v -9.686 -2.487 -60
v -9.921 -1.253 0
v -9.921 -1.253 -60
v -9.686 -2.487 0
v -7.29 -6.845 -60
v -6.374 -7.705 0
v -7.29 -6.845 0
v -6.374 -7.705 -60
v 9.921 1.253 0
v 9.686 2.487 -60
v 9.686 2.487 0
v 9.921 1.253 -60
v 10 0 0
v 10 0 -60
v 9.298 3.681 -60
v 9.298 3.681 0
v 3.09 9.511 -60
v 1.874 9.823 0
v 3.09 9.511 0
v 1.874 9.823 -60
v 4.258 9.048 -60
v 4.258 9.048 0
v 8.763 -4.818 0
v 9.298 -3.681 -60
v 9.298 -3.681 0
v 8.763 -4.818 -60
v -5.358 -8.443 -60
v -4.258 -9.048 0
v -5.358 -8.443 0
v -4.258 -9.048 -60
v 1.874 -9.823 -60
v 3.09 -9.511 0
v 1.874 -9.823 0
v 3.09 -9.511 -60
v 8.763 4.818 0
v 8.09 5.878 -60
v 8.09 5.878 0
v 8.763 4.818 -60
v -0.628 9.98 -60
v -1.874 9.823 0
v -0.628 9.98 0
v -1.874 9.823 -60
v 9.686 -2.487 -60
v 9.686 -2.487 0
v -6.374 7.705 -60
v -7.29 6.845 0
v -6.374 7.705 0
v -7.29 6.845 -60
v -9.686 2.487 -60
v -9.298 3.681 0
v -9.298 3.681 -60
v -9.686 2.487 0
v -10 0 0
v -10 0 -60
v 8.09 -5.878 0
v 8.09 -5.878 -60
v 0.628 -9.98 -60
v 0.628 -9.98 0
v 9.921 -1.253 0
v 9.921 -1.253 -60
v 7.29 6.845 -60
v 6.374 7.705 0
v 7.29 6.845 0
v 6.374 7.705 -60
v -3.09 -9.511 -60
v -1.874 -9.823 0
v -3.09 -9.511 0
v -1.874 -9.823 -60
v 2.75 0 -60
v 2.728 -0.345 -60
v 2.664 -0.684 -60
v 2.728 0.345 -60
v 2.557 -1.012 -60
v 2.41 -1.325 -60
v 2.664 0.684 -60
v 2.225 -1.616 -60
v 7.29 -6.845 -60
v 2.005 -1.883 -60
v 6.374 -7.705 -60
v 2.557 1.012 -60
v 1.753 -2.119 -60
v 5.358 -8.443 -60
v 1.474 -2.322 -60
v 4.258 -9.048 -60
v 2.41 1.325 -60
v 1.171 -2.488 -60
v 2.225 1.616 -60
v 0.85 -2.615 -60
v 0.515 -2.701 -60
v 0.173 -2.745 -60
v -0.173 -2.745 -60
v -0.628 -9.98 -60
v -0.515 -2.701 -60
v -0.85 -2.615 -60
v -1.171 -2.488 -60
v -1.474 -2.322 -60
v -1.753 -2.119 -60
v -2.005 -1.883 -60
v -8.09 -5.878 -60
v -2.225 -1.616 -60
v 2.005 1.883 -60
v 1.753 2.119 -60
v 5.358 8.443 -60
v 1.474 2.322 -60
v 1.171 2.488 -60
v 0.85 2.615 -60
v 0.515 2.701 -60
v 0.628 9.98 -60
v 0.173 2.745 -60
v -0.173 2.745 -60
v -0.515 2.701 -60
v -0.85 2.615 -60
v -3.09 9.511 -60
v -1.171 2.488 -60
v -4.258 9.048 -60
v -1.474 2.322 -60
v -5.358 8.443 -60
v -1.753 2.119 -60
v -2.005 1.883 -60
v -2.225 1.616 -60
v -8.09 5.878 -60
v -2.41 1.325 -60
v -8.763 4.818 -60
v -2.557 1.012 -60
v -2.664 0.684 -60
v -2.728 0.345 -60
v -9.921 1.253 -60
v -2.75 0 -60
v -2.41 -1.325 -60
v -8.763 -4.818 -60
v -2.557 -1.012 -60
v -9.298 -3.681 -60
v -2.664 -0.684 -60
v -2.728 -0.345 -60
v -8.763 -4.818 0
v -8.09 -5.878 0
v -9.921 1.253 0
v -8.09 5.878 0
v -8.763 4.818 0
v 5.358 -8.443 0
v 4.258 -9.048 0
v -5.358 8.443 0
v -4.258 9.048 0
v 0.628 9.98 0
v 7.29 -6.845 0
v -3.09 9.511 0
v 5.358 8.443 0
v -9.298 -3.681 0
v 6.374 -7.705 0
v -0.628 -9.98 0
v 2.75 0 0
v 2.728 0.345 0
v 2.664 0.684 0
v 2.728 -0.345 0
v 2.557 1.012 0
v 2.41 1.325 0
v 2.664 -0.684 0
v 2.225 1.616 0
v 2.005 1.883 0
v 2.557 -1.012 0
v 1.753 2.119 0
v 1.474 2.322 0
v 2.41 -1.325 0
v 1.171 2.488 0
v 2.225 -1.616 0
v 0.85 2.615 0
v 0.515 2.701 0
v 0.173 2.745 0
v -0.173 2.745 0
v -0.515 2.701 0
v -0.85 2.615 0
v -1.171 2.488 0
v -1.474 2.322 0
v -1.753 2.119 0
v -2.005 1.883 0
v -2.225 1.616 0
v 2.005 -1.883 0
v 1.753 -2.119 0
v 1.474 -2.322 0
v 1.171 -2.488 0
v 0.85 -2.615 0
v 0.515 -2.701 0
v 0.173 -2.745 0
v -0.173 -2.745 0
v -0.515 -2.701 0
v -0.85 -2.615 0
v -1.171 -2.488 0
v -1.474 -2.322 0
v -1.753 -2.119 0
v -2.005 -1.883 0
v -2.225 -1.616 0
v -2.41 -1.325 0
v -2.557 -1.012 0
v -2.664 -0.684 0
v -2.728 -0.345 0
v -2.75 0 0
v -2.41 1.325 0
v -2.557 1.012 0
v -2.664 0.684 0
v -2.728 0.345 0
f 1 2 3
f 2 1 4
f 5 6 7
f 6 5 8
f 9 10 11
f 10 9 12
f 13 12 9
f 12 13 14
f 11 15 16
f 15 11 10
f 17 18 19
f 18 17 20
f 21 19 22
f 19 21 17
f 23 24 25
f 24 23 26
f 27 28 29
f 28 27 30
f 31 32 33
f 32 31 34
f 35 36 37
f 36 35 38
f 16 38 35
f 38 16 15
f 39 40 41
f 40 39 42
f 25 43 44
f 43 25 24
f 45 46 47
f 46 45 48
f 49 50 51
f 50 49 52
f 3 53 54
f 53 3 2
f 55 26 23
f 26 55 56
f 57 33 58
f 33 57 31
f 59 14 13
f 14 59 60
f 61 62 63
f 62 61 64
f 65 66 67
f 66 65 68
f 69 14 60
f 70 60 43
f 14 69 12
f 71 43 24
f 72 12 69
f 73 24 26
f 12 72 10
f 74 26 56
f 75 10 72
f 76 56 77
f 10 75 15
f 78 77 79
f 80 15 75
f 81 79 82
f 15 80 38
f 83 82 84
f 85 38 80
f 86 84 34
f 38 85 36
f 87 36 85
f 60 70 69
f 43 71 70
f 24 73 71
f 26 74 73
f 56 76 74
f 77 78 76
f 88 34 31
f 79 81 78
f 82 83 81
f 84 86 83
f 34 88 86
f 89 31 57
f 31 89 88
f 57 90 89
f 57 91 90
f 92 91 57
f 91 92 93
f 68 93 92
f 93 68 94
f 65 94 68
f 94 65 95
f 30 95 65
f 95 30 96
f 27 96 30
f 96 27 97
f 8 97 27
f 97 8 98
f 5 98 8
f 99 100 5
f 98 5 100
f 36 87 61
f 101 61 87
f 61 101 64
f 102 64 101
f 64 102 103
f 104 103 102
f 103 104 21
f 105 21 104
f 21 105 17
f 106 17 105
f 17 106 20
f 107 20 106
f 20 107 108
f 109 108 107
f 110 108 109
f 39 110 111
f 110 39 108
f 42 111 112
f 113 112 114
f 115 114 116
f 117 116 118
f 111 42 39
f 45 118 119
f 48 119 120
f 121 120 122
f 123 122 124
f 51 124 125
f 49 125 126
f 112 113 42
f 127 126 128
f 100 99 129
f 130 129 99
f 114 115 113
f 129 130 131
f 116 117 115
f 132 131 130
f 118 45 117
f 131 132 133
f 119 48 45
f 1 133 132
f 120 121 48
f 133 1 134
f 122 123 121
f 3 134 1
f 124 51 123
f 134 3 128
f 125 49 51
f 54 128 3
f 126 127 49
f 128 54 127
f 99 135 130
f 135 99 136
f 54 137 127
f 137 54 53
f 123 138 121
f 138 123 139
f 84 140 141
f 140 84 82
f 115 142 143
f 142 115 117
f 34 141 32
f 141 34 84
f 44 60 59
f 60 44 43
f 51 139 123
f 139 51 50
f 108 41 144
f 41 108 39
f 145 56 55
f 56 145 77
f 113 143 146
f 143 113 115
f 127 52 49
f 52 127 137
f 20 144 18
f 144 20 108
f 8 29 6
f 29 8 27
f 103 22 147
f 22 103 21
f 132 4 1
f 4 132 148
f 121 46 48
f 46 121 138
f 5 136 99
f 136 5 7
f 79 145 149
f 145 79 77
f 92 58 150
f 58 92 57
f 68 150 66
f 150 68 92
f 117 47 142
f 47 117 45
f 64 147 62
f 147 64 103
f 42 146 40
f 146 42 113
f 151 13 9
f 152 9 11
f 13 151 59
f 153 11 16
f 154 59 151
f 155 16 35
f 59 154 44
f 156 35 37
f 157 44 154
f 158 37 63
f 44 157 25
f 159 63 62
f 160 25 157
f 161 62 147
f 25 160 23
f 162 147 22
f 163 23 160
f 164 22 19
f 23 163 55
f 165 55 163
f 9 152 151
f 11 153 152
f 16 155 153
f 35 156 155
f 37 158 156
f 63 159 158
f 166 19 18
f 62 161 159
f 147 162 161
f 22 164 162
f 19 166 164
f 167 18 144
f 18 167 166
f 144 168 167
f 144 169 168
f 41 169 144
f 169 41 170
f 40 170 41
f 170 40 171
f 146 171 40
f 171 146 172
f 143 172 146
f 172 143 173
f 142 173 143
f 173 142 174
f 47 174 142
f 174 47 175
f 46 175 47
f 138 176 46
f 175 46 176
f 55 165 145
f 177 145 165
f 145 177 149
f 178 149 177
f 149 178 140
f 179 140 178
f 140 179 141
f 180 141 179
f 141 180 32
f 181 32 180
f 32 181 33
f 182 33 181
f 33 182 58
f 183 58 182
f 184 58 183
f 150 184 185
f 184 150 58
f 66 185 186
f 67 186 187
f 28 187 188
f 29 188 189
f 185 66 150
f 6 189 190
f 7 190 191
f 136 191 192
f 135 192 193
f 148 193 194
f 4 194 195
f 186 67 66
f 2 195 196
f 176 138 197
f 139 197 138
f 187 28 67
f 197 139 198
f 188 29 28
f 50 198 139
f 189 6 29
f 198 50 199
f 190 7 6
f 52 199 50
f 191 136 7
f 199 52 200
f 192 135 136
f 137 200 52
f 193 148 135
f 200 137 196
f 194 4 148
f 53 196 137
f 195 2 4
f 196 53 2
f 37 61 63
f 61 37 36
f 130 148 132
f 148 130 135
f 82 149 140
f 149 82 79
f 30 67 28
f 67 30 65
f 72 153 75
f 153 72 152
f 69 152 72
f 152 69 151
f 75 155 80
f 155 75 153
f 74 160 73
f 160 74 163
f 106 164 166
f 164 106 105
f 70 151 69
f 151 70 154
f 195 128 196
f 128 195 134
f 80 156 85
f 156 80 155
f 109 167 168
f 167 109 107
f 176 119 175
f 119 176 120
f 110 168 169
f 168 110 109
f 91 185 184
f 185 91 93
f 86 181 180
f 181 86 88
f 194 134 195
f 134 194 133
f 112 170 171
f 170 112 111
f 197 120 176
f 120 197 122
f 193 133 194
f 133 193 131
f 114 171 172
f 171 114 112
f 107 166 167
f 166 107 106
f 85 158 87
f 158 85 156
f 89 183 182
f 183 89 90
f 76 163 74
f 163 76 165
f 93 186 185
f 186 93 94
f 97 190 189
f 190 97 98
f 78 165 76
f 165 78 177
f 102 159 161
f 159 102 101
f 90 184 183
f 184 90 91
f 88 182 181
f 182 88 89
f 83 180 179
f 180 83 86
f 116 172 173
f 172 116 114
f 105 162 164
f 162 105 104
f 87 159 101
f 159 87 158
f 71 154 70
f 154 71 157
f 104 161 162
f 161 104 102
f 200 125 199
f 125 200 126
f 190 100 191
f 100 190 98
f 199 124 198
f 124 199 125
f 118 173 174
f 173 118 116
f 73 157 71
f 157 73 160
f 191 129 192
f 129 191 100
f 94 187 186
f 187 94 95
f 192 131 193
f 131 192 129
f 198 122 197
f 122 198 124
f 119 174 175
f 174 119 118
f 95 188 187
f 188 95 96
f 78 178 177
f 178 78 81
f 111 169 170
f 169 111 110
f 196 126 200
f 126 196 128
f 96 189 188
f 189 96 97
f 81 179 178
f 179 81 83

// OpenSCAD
$fn = 50;


difference() {
	union() {
		translate(v = [0, 0, -60.0000000000]) {
			cylinder(h = 60, r = 10.0000000000);
		}
		cylinder(h = 0, r = 19.0000000000);
	}
	union() {
		#translate(v = [0, 0, -60]) {
			cylinder(h = 60, r = 2.7500000000);
		}
	}
}
